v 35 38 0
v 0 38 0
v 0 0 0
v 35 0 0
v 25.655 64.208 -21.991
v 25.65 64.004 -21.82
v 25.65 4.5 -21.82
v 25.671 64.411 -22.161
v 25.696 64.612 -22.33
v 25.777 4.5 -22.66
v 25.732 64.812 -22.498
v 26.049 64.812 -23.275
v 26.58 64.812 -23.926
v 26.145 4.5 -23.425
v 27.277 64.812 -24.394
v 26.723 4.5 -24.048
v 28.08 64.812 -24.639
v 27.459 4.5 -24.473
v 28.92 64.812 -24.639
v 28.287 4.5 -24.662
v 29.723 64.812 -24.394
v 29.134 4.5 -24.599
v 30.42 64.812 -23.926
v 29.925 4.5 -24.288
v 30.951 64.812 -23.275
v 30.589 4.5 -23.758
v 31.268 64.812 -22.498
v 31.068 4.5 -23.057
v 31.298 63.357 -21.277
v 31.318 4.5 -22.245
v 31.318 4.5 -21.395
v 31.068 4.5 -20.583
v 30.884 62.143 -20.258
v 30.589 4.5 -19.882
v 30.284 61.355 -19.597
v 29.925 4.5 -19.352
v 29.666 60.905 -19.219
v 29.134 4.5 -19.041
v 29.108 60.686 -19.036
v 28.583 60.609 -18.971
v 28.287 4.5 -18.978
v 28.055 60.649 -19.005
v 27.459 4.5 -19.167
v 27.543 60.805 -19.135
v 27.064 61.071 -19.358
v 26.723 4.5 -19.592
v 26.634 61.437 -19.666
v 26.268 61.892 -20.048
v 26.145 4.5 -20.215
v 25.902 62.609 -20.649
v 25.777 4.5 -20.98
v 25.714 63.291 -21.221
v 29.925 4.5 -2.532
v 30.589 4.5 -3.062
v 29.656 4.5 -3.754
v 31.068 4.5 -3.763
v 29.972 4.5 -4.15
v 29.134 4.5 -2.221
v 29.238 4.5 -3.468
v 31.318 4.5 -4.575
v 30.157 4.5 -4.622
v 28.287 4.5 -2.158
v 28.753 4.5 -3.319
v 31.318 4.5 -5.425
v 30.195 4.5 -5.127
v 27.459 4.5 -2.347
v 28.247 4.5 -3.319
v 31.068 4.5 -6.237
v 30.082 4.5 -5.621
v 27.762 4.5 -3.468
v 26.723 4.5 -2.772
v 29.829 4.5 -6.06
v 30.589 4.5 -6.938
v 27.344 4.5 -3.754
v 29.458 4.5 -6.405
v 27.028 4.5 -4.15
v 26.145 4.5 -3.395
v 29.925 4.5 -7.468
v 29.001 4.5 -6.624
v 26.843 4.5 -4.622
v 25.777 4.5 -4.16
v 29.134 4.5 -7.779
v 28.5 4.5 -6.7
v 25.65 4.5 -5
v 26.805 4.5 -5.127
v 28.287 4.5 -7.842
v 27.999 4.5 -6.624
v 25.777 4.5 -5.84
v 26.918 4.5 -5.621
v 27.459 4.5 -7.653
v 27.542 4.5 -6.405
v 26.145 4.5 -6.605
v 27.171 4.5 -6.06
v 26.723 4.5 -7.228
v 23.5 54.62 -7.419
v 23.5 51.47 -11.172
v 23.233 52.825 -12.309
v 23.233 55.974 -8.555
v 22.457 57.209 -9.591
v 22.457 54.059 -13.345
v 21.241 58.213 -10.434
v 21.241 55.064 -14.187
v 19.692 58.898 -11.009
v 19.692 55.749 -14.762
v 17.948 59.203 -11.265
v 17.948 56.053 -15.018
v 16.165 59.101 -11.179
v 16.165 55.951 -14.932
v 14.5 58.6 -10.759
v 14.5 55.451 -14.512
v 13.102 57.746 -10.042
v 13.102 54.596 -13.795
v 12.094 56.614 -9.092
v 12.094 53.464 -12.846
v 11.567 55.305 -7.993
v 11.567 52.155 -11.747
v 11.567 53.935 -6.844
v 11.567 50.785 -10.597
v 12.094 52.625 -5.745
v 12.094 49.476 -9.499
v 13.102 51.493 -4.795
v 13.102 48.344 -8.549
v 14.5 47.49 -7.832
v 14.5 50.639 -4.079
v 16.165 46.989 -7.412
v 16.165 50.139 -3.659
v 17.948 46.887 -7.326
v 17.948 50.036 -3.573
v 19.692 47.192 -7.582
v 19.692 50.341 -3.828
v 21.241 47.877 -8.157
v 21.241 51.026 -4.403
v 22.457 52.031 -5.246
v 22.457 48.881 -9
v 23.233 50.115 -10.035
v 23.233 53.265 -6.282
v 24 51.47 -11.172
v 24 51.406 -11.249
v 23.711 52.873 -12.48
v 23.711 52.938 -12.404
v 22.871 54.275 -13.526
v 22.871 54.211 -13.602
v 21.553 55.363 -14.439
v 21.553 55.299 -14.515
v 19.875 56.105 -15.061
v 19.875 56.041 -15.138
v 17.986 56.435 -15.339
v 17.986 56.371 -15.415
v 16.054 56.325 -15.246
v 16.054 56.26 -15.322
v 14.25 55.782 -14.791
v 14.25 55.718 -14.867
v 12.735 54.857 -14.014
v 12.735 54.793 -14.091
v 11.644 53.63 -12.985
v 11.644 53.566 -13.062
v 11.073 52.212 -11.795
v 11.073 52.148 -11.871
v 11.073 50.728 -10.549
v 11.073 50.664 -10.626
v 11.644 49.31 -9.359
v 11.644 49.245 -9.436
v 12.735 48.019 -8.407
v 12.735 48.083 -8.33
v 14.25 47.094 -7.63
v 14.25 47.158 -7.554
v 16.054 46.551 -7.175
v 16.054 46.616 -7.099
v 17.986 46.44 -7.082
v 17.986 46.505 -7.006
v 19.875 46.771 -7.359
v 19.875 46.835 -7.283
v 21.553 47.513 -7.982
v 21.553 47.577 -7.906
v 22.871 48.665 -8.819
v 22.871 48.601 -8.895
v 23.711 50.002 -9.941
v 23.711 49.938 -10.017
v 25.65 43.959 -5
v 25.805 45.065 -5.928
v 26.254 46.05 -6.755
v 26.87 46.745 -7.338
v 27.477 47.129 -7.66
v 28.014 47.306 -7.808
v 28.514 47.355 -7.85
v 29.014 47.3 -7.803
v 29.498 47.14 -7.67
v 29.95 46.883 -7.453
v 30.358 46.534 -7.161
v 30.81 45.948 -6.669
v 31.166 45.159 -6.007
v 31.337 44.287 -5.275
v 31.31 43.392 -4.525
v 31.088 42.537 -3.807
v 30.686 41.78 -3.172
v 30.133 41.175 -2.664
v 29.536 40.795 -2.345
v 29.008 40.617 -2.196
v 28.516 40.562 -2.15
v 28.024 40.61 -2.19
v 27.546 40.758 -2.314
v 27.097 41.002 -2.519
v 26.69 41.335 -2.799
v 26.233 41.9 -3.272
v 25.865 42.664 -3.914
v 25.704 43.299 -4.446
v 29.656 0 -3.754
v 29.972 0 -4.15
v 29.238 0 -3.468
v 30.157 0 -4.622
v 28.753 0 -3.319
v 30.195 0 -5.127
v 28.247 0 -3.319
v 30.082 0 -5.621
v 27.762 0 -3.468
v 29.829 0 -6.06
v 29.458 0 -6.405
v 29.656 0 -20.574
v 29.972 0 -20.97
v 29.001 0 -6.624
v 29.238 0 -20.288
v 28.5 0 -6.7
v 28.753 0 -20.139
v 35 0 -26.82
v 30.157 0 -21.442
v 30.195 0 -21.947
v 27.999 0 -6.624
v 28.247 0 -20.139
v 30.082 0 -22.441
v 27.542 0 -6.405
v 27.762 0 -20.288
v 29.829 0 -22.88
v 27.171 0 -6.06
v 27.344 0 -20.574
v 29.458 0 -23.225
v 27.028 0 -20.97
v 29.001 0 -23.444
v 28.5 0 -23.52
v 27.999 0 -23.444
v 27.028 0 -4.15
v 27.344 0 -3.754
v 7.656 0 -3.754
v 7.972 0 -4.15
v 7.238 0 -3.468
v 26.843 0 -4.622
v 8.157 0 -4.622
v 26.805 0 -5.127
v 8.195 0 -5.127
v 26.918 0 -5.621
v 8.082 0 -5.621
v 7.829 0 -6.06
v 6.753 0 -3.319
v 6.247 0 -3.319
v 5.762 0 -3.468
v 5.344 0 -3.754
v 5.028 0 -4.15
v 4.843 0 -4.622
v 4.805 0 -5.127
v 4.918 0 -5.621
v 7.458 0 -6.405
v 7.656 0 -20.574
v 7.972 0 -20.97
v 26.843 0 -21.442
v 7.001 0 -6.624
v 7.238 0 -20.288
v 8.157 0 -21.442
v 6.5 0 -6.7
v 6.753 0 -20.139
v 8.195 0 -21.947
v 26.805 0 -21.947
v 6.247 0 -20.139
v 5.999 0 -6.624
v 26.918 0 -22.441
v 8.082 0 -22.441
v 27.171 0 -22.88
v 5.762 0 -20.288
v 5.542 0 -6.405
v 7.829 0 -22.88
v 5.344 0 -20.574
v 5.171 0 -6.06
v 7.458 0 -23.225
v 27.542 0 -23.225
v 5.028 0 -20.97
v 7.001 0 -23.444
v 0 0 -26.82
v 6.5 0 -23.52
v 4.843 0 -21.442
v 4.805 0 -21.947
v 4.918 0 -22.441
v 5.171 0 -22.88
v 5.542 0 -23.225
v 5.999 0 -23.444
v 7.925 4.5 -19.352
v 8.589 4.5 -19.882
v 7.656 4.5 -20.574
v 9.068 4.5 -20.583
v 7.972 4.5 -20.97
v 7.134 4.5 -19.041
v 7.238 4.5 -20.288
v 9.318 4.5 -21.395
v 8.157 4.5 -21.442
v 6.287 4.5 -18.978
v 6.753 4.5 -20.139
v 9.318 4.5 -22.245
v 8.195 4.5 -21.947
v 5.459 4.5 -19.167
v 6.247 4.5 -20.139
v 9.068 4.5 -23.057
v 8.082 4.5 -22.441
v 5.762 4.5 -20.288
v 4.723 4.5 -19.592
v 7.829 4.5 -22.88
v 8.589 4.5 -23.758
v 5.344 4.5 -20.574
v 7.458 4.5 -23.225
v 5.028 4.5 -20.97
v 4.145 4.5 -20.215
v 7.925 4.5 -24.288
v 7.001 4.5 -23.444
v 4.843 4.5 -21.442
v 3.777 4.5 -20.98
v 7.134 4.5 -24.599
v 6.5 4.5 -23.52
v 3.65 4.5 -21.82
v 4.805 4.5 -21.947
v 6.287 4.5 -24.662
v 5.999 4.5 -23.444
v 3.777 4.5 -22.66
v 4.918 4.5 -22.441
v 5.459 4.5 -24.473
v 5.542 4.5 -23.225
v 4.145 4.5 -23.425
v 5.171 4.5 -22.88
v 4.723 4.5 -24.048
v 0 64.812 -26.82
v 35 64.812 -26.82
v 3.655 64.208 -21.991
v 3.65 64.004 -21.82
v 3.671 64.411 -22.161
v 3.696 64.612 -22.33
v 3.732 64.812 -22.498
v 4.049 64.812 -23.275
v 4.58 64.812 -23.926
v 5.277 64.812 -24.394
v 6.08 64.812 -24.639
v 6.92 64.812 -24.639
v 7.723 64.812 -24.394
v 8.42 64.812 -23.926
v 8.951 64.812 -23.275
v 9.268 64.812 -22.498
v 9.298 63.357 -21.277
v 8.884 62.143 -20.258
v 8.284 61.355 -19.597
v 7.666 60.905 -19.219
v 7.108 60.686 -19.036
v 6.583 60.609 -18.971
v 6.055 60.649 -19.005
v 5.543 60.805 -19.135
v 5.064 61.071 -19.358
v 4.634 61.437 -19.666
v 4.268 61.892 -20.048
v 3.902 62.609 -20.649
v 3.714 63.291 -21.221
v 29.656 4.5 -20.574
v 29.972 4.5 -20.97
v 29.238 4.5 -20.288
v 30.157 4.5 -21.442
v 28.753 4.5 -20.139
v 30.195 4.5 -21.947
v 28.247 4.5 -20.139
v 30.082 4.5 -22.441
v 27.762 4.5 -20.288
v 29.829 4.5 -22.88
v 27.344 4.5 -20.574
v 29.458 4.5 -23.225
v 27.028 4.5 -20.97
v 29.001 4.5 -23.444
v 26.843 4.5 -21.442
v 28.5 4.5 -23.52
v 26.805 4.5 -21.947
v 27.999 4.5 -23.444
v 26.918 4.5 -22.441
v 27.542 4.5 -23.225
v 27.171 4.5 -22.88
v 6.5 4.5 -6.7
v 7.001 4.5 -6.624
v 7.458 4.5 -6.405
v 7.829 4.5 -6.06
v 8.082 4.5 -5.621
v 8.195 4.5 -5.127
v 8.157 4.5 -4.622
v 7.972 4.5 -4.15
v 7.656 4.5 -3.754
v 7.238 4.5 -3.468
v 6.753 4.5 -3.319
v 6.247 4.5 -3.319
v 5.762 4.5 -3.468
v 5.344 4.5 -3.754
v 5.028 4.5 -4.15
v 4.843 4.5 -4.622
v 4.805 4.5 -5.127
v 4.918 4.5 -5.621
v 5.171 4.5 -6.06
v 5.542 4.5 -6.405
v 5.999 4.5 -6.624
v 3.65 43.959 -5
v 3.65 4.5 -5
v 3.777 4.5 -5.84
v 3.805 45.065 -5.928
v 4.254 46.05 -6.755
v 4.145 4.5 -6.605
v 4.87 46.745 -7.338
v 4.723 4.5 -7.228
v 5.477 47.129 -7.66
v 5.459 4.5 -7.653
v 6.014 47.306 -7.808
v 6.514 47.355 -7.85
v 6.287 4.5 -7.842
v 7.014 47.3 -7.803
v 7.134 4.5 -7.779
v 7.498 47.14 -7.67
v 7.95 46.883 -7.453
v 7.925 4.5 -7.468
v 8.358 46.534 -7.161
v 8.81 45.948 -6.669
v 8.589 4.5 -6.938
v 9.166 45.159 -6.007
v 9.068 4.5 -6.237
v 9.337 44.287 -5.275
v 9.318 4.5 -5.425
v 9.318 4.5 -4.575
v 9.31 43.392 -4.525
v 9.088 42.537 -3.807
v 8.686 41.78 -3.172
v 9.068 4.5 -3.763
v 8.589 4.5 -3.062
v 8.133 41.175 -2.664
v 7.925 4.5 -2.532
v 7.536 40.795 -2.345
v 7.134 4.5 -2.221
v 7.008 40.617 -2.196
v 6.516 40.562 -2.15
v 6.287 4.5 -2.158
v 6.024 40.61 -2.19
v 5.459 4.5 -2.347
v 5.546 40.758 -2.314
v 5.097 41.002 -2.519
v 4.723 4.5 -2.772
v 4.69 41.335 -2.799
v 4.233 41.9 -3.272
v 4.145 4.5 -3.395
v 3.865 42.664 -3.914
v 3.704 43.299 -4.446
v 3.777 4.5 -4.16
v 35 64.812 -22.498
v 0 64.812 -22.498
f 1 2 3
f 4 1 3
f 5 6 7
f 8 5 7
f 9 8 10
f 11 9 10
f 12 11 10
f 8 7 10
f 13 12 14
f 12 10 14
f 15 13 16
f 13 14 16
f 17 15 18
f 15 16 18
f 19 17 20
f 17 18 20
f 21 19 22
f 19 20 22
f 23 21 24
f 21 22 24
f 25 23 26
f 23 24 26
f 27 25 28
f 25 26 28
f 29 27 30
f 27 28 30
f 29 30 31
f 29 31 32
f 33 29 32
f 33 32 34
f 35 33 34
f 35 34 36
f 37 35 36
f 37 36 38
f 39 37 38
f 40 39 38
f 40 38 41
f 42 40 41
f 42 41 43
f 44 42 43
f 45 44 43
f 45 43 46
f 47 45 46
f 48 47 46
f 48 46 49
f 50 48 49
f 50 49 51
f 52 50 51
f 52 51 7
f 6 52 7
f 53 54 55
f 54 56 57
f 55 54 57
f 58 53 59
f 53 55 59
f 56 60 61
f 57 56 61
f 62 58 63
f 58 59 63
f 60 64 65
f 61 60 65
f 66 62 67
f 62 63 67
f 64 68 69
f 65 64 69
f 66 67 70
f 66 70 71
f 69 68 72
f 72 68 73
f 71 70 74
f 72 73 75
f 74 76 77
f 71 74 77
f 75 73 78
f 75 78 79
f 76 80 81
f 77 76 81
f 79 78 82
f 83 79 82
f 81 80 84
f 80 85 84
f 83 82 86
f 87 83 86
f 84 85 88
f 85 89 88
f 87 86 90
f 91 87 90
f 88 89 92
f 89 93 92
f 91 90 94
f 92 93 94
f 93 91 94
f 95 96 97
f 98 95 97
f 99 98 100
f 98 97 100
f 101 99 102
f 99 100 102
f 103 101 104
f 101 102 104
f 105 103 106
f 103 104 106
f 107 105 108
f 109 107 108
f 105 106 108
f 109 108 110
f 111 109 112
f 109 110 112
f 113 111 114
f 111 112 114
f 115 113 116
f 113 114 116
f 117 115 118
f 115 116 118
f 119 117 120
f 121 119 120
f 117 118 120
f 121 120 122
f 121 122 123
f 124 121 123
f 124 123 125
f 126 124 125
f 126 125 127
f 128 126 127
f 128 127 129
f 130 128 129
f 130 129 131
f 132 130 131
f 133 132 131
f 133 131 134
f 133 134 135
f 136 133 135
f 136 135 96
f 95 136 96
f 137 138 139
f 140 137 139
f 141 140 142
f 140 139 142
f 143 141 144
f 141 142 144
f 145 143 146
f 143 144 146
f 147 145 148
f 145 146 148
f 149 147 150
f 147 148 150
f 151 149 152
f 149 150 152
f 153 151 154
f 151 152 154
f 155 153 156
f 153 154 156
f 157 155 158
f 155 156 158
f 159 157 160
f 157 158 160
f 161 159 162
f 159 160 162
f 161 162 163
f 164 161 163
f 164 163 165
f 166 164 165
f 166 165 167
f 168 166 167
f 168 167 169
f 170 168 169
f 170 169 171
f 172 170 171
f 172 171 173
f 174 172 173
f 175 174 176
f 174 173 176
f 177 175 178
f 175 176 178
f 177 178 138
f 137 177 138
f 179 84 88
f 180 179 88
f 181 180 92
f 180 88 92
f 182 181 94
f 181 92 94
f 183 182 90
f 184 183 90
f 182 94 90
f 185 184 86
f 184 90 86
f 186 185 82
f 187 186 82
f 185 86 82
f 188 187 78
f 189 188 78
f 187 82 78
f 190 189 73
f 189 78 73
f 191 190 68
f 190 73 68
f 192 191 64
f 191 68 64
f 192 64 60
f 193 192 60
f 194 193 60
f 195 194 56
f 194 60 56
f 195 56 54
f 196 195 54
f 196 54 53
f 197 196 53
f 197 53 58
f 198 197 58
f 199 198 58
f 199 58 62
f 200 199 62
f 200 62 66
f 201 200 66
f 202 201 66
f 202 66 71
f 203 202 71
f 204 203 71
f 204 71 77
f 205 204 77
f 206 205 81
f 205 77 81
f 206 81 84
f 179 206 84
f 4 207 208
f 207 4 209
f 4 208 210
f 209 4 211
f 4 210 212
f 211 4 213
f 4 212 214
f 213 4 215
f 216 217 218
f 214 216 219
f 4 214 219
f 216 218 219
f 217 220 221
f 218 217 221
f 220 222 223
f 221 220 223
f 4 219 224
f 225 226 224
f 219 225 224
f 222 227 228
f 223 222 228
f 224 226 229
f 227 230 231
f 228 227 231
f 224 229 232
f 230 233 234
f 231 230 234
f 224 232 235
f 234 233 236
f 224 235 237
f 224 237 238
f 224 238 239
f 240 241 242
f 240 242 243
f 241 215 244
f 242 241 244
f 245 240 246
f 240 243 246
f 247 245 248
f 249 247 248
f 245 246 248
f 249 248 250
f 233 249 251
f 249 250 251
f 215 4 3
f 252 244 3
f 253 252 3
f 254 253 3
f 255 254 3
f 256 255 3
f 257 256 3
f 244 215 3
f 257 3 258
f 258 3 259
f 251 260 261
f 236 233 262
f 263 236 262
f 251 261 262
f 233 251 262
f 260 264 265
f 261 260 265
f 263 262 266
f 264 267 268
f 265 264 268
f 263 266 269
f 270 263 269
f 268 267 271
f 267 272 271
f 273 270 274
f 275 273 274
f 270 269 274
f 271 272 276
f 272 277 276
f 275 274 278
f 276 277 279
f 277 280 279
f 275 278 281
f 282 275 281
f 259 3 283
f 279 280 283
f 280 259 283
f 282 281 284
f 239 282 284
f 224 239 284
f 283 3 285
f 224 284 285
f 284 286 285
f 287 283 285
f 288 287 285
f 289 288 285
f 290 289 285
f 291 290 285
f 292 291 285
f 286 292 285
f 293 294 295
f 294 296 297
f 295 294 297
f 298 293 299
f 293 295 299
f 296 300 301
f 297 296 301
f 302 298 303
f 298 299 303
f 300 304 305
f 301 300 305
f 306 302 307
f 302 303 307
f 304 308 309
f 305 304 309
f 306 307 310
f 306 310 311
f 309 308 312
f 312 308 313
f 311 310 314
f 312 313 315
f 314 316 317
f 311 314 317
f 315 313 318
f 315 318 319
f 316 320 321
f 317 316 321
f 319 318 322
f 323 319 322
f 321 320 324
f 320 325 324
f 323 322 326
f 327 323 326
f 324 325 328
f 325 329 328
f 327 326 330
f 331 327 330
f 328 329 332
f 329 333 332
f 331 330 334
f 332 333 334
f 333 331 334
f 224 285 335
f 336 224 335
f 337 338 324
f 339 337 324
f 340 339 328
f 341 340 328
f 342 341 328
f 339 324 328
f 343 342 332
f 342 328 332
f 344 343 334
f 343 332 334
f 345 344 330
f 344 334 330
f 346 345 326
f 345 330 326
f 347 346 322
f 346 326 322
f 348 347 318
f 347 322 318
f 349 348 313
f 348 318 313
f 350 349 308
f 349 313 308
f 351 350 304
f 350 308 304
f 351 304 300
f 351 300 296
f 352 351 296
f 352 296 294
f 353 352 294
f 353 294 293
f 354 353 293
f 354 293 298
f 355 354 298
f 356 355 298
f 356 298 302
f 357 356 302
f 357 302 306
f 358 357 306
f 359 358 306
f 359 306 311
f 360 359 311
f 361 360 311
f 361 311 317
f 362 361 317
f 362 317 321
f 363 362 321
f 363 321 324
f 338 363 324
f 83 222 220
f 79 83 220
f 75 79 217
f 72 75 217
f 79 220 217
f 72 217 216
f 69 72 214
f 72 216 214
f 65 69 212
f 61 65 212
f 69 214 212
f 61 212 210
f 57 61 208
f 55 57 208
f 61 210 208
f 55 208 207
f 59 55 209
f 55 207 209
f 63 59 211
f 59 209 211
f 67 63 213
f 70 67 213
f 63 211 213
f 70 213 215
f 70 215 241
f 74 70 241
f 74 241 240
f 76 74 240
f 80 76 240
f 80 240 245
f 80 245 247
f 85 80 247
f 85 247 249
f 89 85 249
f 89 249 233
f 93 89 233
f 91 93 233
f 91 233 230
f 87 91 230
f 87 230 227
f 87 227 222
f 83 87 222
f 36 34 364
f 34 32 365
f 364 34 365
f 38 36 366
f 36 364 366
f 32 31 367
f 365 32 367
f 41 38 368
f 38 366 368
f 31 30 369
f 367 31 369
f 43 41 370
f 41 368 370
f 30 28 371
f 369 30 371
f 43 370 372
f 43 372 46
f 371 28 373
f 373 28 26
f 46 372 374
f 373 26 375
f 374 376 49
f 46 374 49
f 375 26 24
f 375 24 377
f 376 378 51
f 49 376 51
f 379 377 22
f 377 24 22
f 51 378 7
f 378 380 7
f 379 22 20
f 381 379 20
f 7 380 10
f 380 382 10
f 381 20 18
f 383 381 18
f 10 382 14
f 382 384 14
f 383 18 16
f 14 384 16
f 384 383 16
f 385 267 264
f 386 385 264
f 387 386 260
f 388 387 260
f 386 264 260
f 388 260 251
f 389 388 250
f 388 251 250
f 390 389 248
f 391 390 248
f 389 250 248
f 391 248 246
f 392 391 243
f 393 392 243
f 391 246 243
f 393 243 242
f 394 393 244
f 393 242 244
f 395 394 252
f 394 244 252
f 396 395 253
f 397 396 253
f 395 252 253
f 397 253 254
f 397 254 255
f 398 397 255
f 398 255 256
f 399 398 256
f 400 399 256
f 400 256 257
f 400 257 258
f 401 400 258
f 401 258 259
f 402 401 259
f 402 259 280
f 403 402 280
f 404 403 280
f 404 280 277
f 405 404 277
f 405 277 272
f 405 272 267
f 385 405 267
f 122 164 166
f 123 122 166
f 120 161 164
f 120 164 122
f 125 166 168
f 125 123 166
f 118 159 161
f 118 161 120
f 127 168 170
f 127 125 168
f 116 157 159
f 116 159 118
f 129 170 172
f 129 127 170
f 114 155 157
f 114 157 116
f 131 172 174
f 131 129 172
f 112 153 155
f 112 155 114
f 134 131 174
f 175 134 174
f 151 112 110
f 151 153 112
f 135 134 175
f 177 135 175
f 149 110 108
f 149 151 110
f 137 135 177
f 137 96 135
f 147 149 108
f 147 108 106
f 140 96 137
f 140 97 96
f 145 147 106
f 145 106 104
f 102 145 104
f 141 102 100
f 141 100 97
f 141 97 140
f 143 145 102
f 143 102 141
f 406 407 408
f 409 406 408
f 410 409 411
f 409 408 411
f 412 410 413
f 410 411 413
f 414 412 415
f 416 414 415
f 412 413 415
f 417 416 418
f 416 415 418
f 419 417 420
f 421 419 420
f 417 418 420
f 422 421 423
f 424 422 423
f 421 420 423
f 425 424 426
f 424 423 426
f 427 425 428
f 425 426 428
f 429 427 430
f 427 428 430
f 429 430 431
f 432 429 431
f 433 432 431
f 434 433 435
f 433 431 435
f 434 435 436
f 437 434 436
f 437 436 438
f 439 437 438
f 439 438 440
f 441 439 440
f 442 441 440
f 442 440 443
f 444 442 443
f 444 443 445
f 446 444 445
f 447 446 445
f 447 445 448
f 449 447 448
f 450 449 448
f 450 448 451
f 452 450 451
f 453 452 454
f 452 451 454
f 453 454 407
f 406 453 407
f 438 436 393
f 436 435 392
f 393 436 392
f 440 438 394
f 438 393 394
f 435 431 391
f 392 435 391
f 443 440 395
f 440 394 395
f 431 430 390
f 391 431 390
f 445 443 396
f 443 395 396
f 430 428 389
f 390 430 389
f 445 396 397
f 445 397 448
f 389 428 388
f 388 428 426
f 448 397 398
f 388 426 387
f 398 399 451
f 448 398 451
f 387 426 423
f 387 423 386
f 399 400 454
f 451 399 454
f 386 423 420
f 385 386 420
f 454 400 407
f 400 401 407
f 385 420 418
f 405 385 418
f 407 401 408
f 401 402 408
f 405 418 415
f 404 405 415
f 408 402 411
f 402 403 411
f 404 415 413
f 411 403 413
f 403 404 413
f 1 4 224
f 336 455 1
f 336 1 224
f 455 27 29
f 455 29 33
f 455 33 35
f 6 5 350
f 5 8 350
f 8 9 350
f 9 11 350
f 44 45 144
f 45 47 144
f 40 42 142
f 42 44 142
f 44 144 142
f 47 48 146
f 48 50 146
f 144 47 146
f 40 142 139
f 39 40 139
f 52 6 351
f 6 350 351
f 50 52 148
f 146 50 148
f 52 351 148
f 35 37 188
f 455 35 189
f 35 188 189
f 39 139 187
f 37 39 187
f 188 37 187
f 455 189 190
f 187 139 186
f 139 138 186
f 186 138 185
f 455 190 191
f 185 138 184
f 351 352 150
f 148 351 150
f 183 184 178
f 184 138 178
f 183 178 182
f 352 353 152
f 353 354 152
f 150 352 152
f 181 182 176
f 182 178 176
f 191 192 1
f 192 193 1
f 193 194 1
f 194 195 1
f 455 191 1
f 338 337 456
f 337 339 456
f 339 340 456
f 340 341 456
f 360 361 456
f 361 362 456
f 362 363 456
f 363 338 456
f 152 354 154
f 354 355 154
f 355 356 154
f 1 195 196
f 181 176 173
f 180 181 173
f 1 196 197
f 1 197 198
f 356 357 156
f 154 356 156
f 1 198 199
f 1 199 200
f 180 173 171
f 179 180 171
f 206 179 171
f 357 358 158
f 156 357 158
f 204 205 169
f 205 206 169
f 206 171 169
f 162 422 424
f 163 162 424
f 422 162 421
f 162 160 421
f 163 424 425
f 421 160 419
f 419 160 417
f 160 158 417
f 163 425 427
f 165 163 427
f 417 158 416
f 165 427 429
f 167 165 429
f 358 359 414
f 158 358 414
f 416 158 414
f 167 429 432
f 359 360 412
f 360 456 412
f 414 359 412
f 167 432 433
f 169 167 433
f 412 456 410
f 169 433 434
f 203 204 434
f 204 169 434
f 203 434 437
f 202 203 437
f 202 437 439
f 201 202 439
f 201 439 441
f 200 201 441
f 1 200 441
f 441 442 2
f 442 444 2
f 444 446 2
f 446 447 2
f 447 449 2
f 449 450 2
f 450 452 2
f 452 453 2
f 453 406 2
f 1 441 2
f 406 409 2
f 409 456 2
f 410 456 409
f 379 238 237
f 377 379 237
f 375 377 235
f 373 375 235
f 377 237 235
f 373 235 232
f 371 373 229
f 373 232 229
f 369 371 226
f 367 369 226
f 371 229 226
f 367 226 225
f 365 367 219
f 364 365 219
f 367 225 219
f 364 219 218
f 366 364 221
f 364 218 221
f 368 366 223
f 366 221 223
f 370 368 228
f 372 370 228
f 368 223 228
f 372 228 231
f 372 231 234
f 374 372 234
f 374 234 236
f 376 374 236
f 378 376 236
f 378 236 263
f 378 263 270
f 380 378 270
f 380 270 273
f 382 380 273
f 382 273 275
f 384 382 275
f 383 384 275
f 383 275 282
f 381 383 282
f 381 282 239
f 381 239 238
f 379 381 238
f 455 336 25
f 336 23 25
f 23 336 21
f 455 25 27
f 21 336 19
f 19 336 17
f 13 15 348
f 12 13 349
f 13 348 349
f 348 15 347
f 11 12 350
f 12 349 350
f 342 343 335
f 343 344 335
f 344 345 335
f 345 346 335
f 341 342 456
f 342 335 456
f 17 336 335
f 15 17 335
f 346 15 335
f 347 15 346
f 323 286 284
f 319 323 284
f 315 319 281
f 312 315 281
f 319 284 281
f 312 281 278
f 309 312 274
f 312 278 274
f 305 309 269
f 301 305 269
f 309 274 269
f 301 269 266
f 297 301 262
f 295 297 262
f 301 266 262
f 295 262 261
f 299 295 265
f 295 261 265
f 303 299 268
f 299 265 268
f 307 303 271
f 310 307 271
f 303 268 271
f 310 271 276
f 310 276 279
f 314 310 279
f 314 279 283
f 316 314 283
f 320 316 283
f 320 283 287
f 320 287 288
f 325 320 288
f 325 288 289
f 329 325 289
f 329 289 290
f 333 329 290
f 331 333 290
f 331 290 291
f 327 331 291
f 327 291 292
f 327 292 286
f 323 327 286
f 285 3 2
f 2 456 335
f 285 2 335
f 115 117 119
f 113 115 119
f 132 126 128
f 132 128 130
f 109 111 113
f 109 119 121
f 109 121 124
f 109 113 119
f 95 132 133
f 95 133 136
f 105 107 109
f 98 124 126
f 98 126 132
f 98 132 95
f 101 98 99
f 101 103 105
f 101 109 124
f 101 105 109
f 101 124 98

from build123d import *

# Parameters (mm, degrees)
AUFSATZ_LINEAR_AUSTRAGEN1_DEPTH      = 35
SKIZZE3_R                            = 6
AUFSATZ_LINEAR_AUSTRAGEN2_DEPTH      = 5
SKIZZE4_R                            = 6.5
AUFSATZ_LINEAR_AUSTRAGEN3_DEPTH      = 0.1
SKIZZE7_R                            = 2.85
SCHNITT_LINEAR_AUSTRAGEN1_DEPTH      = 61.311555509
F_3_4_3_4_DURCHMESSER_BOHRUNG1_D     = 3.4
F_3_4_3_4_DURCHMESSER_BOHRUNG1_DEPTH = 4.5


with BuildPart() as part:
    # Skizze1 → Aufsatz-Linear austragen1 (new body)
    with BuildSketch(Plane(origin=(0, 0, 0), x_dir=(0, 0, -1), z_dir=(1, 0, 0))):
        Polygon((0, 0), (22.497566339, 0), (26.82, 0), (26.82, 64.811555509), (22.497566339, 64.811555509), (0, 38), align=None)
    extrude(amount=AUFSATZ_LINEAR_AUSTRAGEN1_DEPTH)

    # Skizze3 → Aufsatz-Linear austragen2 (add)
    with BuildSketch(Plane(origin=(0, 15.700684624, 18.711347307), x_dir=(1, 0, 0), z_dir=(0, 0.64278761, 0.766044443))):
        with Locations((17.5, 46.609688839)):
            Circle(SKIZZE3_R)
    extrude(amount=AUFSATZ_LINEAR_AUSTRAGEN2_DEPTH)

    # Skizze4 → Aufsatz-Linear austragen3 (add)
    with BuildSketch(Plane(origin=(0, 15.700684624, 18.711347307), x_dir=(1, 0, 0), z_dir=(0, 0.64278761, 0.766044443))):
        with Locations((17.5, 46.609688839)):
            Circle(SKIZZE4_R)
    extrude(amount=AUFSATZ_LINEAR_AUSTRAGEN3_DEPTH)

    # Skizze7 → Schnitt-Linear austragen1 (cut, through all)
    with BuildSketch(Plane(origin=(0, 4.5, 0), x_dir=(-1, 0, 0), z_dir=(0, -1, 0))):
        with Locations((-28.5, 5)):
            Circle(SKIZZE7_R)
        with Locations((-6.5, 5)):
            Circle(SKIZZE7_R)
        with Locations((-6.5, 21.82)):
            Circle(SKIZZE7_R)
        with Locations((-28.5, 21.82)):
            Circle(SKIZZE7_R)
    extrude(amount=-SCHNITT_LINEAR_AUSTRAGEN1_DEPTH, mode=Mode.SUBTRACT)

    # Ø3.4 (3.4) Durchmesser Bohrung1
    with Locations(Plane(origin=(6.5, 4.5, -5), x_dir=(0, 0, 1), z_dir=(0, 1, 0))):
        with Locations((0, 0), (-16.82, 0), (-16.82, 22), (0, 22)):
            Hole(F_3_4_3_4_DURCHMESSER_BOHRUNG1_D / 2, depth=F_3_4_3_4_DURCHMESSER_BOHRUNG1_DEPTH)


solid = part.part
